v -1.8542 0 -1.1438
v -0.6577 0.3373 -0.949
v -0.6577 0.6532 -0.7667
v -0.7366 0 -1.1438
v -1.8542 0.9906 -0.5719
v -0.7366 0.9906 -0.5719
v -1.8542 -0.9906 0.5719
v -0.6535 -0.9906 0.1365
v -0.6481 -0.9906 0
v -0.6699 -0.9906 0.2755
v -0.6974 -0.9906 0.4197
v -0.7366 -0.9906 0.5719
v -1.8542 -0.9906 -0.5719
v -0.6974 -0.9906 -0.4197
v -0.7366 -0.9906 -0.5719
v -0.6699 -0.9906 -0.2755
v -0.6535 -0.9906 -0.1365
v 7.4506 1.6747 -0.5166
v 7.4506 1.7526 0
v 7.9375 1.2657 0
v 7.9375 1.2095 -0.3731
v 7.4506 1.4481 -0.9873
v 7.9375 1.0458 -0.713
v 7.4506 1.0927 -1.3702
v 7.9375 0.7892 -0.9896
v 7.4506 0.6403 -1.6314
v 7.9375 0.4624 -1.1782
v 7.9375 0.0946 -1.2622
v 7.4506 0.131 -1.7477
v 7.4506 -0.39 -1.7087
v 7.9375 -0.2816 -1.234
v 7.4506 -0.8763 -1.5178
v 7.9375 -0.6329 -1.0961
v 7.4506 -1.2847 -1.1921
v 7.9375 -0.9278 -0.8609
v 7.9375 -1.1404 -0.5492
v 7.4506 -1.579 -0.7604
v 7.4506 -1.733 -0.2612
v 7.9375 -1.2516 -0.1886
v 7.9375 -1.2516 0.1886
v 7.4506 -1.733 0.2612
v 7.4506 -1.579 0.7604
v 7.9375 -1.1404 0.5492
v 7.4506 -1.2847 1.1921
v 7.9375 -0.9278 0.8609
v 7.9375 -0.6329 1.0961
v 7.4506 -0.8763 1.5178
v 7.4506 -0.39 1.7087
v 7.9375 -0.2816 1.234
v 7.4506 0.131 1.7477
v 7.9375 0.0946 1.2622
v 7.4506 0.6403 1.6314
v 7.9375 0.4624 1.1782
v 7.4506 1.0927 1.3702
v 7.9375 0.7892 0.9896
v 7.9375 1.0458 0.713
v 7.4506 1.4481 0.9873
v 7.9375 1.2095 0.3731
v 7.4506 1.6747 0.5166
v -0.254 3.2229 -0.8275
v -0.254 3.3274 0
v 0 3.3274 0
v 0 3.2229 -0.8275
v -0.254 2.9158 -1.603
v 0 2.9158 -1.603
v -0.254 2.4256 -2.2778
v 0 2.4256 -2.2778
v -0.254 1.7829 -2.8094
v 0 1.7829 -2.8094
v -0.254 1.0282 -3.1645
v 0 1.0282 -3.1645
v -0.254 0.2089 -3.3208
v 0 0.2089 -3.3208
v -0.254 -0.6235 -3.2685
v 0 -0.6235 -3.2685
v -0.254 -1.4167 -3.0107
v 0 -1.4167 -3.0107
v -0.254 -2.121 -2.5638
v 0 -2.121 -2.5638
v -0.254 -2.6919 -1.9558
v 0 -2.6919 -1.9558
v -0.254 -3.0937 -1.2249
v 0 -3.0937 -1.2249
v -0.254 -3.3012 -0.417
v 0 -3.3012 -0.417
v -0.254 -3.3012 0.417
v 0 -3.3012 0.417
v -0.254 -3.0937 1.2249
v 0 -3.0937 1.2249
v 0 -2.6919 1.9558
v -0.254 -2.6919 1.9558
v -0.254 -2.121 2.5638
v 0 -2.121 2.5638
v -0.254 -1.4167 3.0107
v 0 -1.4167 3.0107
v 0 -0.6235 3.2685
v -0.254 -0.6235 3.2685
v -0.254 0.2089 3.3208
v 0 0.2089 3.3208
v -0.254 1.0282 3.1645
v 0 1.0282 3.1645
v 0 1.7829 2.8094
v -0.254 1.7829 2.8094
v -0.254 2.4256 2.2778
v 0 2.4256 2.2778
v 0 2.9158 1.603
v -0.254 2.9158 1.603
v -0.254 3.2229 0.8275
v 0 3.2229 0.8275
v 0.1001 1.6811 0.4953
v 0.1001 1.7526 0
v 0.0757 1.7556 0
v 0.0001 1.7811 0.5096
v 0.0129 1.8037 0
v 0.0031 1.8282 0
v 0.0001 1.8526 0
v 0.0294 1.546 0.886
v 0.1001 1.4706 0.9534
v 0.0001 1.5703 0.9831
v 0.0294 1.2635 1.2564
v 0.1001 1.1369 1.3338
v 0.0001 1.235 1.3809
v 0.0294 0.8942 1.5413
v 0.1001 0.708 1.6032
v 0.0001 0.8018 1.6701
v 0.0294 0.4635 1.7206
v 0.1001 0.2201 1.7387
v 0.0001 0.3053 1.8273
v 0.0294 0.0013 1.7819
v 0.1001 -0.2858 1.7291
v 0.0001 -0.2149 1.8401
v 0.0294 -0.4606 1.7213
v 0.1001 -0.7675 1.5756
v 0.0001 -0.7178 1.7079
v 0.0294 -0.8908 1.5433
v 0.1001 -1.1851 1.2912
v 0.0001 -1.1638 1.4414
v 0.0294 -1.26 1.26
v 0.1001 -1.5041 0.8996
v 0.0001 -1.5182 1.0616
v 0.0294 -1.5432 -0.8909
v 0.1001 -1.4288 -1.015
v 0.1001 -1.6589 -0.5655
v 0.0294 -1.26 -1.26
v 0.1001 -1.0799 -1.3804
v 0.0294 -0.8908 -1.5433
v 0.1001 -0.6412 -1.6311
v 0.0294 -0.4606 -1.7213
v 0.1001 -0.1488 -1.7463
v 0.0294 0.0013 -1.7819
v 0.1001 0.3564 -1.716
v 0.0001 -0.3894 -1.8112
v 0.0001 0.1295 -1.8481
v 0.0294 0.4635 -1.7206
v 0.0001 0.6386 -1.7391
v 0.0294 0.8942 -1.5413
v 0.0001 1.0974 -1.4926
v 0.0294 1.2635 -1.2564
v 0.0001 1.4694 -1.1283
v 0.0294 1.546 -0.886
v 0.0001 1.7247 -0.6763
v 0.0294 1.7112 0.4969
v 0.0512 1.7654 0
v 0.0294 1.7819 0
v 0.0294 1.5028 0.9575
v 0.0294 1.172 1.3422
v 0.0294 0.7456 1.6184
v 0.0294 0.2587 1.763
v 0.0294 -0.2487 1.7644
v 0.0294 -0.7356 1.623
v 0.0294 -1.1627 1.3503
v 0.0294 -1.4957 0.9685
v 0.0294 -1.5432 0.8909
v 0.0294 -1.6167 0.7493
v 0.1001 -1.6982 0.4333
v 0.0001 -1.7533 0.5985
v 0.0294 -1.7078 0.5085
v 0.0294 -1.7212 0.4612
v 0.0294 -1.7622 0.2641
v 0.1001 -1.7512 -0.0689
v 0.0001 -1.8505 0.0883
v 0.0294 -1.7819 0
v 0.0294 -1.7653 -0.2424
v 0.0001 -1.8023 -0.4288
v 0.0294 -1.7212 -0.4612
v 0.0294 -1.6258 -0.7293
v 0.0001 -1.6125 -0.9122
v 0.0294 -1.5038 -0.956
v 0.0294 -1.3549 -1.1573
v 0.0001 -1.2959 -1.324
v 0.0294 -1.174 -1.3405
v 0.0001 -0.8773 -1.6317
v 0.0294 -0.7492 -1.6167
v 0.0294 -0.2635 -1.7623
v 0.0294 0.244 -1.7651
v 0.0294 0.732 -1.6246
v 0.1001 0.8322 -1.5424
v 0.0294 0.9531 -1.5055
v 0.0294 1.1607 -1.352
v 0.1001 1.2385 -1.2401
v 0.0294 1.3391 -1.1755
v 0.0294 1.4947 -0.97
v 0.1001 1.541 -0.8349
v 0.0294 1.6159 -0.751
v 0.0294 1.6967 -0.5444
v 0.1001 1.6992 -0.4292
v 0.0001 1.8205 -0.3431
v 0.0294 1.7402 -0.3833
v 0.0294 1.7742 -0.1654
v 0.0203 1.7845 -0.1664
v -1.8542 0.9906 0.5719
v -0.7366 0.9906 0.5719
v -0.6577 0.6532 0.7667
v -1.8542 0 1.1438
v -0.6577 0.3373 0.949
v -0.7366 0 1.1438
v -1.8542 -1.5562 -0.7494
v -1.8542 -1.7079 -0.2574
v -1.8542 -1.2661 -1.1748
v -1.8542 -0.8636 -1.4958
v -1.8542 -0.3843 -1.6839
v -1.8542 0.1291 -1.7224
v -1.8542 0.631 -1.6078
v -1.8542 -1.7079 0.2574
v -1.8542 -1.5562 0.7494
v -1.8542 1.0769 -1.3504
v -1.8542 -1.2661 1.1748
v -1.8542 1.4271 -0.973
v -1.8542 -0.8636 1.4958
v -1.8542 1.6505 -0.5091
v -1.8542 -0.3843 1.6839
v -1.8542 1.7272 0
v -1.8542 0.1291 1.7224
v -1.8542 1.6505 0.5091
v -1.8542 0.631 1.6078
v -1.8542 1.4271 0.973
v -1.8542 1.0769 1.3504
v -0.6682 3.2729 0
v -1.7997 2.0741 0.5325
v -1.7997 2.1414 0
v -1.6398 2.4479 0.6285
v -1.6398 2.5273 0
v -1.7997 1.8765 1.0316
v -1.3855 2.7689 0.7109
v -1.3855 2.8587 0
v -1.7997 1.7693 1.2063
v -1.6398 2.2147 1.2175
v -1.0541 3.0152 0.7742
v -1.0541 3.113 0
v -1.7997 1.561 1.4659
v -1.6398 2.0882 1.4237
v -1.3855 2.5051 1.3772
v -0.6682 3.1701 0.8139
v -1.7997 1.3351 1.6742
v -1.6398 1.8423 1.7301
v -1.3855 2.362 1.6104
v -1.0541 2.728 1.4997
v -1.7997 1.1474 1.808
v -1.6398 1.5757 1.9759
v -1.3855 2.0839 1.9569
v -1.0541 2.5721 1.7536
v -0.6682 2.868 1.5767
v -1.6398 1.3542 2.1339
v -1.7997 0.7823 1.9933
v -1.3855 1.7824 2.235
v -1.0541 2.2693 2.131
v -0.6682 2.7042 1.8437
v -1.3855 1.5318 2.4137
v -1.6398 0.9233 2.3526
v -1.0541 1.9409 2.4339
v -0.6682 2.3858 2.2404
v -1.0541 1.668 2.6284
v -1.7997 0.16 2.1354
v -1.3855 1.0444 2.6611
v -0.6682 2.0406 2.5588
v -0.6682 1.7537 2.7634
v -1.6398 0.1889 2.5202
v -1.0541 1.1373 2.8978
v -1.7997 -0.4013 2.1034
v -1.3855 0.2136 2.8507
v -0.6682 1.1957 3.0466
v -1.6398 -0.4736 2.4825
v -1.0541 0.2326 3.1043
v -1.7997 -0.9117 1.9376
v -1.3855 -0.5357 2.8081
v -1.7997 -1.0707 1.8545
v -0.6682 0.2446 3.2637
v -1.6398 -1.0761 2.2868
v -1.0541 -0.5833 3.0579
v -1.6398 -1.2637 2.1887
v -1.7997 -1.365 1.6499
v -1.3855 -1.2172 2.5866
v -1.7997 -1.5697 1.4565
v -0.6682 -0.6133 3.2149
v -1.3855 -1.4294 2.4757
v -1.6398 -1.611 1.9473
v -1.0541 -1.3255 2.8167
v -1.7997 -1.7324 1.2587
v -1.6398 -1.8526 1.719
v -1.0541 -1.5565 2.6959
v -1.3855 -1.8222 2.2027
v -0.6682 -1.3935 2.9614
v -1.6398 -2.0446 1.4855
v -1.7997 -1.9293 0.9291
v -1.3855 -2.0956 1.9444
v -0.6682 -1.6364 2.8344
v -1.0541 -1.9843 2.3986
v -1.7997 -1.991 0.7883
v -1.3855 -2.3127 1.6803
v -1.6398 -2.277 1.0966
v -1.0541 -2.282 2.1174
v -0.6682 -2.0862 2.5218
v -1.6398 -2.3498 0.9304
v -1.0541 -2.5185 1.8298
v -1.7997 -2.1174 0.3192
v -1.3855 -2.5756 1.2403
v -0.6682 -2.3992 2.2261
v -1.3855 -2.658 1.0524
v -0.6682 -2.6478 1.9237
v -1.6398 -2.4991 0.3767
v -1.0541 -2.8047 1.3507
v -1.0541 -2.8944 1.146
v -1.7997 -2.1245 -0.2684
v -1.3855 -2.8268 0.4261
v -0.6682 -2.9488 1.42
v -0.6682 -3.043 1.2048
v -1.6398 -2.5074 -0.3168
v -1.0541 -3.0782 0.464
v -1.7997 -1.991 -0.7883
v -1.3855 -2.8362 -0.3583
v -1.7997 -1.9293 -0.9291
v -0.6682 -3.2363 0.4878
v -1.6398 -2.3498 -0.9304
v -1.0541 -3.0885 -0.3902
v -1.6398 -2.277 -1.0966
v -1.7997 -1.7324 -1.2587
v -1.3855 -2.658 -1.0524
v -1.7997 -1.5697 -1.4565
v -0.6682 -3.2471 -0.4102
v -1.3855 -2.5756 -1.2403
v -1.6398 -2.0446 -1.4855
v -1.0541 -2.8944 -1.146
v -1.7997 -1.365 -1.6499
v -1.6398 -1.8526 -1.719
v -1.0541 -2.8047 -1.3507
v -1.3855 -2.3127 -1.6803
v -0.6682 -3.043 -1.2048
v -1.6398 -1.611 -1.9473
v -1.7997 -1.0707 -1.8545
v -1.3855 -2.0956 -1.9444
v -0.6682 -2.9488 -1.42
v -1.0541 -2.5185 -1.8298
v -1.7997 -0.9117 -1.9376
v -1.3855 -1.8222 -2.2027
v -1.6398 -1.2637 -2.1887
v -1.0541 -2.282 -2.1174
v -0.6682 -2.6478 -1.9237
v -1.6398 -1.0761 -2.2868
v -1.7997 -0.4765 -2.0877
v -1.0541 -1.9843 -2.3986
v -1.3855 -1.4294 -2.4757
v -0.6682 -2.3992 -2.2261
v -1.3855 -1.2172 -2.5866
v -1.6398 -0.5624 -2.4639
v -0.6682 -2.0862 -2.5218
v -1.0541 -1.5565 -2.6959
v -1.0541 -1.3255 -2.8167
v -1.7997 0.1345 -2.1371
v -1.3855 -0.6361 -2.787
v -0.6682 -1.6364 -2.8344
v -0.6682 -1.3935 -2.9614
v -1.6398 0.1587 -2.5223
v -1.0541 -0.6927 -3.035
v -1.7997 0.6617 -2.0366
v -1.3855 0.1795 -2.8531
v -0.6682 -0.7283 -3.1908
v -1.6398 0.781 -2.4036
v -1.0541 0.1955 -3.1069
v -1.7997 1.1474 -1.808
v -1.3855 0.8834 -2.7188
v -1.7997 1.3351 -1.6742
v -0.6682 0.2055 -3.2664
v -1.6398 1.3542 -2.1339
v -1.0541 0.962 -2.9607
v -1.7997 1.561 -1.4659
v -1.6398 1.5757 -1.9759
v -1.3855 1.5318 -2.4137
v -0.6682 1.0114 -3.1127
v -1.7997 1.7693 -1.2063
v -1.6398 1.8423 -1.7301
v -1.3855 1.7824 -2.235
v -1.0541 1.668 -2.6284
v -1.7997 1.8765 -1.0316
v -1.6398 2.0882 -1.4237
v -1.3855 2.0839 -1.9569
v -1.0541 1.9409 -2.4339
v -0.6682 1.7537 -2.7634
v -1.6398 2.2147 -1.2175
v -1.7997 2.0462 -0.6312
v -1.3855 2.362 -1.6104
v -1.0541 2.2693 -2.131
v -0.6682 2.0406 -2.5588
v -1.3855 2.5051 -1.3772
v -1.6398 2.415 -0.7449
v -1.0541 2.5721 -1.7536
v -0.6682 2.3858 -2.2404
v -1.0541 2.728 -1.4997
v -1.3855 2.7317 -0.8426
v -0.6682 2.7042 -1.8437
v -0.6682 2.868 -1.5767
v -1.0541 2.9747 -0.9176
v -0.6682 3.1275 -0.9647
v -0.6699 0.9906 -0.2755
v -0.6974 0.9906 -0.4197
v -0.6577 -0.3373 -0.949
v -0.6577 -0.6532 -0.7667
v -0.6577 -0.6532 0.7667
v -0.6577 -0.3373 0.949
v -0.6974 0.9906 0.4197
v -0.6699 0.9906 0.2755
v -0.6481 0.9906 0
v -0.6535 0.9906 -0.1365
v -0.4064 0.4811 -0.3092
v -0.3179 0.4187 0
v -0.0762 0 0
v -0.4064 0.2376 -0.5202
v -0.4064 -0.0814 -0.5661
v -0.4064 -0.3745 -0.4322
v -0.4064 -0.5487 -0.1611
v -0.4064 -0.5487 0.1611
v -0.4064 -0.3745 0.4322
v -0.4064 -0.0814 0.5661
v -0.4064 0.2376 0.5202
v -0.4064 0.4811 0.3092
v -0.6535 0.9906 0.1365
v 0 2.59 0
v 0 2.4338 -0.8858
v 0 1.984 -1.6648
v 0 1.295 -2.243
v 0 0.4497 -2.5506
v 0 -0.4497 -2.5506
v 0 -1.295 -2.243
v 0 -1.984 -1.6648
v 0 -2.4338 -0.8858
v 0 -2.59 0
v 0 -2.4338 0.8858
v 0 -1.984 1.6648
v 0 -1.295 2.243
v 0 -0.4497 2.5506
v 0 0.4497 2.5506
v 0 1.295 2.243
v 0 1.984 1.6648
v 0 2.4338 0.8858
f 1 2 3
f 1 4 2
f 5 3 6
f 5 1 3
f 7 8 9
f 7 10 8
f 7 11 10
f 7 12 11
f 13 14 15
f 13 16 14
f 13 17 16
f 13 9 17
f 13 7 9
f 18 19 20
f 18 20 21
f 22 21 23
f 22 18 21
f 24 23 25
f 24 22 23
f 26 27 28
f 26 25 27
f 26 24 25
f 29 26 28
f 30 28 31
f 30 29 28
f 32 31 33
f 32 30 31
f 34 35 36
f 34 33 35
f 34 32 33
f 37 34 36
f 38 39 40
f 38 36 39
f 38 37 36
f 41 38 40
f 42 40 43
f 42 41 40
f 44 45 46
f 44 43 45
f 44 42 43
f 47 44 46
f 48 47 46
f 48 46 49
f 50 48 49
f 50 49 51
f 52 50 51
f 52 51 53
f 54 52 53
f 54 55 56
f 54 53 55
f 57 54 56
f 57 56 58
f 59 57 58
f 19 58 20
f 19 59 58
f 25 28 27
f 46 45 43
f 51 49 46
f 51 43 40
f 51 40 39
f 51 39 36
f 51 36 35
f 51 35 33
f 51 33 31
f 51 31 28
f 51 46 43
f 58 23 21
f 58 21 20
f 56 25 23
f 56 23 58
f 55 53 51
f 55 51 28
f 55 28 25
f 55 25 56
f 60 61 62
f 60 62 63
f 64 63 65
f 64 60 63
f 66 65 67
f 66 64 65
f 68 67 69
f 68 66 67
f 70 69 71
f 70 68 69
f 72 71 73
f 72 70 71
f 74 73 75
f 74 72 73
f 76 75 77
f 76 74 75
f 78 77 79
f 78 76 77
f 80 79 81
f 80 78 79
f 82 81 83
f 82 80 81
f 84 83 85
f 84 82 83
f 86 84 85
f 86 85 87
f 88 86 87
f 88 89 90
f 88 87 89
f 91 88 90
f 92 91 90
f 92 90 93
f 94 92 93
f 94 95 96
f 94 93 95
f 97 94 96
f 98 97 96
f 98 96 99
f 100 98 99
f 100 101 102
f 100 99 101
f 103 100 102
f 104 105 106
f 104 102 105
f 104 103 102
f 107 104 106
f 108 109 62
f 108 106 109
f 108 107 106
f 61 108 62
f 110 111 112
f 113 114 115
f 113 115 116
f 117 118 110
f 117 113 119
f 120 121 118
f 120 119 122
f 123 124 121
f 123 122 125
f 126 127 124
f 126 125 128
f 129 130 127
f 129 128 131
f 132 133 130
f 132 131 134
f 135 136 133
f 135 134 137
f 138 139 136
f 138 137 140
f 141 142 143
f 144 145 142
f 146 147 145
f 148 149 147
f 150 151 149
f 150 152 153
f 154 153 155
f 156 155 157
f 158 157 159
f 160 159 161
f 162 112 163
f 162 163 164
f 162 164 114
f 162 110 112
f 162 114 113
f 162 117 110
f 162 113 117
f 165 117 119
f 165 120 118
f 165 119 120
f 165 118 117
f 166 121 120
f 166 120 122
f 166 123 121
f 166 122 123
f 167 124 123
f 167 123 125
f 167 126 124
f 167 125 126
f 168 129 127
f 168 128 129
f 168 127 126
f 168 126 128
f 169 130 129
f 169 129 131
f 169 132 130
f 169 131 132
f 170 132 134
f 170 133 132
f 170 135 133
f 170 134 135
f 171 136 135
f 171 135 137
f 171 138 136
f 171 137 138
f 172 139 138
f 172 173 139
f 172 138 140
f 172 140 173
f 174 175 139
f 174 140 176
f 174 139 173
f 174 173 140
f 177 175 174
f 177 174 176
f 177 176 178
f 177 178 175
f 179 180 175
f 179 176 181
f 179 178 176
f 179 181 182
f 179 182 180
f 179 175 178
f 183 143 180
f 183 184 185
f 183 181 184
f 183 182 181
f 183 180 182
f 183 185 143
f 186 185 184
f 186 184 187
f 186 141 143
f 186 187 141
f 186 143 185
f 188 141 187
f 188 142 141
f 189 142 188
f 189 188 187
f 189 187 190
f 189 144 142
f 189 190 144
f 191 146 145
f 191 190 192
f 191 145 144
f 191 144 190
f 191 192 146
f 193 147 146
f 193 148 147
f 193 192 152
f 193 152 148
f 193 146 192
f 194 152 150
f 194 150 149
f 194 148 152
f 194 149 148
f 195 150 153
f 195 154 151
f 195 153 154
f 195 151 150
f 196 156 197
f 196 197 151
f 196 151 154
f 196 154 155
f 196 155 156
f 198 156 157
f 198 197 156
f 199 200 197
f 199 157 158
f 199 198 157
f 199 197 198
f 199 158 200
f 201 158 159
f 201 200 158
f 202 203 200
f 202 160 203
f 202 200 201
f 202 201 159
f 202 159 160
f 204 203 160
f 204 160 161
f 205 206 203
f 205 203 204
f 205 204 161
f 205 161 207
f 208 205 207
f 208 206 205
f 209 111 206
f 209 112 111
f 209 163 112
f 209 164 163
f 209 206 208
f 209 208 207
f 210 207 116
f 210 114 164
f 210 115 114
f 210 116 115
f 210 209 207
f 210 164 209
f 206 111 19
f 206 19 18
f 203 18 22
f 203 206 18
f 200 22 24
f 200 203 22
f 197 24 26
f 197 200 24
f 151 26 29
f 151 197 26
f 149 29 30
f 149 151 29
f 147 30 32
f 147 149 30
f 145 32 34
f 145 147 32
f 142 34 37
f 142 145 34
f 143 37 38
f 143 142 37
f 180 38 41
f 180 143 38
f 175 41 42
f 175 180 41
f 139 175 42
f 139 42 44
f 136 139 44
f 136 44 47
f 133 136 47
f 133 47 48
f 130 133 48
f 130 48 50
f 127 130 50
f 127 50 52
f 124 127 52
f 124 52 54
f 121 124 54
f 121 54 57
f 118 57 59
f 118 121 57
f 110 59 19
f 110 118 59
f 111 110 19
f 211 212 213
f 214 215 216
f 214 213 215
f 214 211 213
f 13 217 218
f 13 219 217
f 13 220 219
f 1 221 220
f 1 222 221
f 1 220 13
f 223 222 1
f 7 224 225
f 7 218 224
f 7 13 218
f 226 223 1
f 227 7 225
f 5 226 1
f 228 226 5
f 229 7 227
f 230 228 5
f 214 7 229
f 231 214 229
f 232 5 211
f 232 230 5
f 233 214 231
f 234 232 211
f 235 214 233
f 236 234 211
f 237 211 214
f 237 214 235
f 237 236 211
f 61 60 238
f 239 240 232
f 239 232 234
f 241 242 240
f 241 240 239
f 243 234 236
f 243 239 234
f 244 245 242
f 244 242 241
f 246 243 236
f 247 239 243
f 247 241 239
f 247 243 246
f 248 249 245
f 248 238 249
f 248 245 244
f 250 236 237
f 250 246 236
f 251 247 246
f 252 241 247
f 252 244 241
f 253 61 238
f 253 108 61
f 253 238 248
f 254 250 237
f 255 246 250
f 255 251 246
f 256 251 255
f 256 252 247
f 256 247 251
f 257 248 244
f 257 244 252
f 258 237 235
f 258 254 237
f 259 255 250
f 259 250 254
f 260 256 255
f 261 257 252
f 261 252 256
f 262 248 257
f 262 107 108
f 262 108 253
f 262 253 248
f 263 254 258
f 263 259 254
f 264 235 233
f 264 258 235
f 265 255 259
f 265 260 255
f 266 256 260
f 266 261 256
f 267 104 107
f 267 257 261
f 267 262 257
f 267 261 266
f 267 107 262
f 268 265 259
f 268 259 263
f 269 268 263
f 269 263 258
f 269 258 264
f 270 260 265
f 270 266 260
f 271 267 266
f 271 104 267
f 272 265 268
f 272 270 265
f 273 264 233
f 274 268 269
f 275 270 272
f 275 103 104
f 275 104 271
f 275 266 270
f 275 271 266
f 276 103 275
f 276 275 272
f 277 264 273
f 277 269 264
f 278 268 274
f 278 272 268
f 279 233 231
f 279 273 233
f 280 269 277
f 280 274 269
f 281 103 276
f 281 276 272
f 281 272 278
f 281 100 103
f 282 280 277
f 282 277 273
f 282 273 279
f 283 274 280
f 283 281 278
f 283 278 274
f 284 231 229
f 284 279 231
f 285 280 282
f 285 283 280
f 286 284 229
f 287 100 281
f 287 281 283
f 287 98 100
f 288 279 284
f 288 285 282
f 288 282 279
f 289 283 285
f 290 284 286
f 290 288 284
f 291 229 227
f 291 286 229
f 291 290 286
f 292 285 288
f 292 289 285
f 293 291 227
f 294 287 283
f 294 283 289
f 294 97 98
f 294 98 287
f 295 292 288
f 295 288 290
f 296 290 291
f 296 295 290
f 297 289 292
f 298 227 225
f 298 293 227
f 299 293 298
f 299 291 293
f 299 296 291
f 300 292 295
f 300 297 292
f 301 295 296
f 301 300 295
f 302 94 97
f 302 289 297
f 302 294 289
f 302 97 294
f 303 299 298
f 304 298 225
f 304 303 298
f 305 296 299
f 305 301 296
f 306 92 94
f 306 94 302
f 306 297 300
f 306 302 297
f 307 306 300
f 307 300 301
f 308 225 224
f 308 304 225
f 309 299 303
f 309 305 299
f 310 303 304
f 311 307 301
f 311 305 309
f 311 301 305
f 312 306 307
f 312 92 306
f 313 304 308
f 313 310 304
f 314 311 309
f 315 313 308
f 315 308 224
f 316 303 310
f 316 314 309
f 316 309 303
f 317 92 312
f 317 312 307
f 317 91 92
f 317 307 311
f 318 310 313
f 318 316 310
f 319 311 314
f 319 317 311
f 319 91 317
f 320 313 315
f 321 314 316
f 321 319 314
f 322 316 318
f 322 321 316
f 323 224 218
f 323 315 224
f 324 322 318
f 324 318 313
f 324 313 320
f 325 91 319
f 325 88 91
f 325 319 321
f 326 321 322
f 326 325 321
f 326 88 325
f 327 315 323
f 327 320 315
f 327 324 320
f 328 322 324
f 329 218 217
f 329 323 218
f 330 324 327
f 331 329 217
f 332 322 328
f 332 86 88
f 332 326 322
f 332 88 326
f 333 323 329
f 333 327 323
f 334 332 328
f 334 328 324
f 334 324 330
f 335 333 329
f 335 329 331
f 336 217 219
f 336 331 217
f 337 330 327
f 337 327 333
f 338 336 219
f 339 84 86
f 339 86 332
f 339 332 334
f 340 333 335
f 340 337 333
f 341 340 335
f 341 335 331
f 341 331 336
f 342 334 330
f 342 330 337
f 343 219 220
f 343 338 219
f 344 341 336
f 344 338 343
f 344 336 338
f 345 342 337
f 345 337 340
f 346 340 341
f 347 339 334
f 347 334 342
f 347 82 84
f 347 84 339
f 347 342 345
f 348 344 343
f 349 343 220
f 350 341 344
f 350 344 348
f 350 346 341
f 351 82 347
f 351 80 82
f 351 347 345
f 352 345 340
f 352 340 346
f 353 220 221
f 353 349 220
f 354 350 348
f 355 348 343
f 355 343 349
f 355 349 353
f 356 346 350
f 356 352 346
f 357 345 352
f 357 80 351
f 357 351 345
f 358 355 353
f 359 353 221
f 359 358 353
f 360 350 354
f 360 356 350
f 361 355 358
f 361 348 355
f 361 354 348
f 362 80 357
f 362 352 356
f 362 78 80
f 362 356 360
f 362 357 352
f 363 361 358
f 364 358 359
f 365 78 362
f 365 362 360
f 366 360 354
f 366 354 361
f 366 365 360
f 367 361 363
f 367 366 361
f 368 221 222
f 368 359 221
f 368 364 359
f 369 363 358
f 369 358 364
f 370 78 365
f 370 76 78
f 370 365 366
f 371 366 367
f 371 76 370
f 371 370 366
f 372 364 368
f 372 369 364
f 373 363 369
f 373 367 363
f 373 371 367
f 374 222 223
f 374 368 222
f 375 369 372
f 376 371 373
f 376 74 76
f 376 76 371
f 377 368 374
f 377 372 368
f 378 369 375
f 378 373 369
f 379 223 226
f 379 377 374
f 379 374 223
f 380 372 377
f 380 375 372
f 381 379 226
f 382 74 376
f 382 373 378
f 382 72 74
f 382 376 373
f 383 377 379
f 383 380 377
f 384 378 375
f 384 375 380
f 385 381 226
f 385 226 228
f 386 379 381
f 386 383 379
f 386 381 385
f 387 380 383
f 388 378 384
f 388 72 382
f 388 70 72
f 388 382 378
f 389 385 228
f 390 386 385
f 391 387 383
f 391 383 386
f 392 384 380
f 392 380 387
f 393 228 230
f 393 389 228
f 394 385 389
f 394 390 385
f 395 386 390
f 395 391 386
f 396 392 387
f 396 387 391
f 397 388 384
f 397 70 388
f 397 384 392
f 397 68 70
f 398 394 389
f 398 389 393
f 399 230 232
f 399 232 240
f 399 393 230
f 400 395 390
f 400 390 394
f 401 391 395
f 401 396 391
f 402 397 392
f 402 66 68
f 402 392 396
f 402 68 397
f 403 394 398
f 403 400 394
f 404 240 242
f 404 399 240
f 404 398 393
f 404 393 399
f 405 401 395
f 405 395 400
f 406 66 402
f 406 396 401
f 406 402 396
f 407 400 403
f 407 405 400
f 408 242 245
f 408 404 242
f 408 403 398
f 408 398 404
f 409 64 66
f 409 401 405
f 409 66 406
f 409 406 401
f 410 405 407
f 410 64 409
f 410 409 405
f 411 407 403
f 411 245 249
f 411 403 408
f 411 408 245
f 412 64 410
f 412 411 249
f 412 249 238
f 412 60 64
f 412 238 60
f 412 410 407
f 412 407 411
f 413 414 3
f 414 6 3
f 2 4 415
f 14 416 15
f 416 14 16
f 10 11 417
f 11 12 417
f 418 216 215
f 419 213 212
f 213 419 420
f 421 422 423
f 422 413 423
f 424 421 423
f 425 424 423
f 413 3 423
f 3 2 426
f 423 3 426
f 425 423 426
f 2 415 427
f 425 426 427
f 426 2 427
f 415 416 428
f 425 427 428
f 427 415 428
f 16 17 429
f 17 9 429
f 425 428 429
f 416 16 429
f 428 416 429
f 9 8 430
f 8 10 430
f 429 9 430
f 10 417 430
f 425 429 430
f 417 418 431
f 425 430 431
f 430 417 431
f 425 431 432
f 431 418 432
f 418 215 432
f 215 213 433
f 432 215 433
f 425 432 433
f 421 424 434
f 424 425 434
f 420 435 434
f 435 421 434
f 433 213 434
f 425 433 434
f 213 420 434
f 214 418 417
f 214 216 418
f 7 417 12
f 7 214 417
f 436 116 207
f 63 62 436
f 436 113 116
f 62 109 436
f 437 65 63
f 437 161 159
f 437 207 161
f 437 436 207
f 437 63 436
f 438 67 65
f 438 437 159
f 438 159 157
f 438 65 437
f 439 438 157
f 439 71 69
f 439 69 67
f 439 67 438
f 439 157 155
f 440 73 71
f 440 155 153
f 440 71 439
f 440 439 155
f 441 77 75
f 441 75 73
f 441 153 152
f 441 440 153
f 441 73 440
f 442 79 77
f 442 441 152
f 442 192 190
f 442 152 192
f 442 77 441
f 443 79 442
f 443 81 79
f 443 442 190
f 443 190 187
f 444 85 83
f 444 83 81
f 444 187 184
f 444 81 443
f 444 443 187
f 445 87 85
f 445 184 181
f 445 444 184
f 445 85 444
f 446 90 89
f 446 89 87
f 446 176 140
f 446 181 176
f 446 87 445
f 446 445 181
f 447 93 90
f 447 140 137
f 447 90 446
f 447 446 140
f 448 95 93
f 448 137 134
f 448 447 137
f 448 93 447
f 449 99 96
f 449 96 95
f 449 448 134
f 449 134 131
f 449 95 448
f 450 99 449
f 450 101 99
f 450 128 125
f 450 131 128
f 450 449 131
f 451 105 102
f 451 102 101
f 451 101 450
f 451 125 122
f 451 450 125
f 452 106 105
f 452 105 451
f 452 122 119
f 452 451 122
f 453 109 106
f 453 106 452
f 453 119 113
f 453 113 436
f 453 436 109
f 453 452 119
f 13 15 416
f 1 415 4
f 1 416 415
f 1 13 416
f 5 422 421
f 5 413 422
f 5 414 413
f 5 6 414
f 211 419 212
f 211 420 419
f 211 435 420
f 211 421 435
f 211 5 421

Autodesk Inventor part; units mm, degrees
ref_plane "YZ Plane" through (0, 0, 0) normal (1, 0, 0) x (0, 1, 0)
ref_plane "XZ Plane" through (0, 0, 0) normal (0, 1, 0) x (-1, 0, 0)
sketch "Sketch1" plane through (0, 0, 0) normal (0, 0, 1) x (1, 0, 0)
  line L0 (-0.0762, 0) -> (7.9375, 0)
  line L1 (7.9375, 0) -> (7.9375, 1.7526)
  line L2 (7.9375, 1.7526) -> (1.5902, 1.7526)
  line L3 (1.5902, 1.7526) -> (0.0001, 1.7526)
  line L4 (0.0001, 1.7526) -> (0, 1.7526)
  line L5 (0, 1.7526) -> (0, 3.3274)
  line L6 (0, 3.3274) -> (-1.8542, 3.3274)
  line L7 (-1.8542, 3.3274) -> (-1.8542, 1.1438)
  line L8 (-1.8542, 1.1438) -> (-0.7366, 1.1438)
  line L9 (-0.7366, 1.1438) -> (-0.0762, 0)
  line L10 (-3.8125, 0) -> (9.8958, 0) projected
  line L11 (0, -0.6655) -> (0, 3.9929) projected
  line L12 (1.5902, 1.7526) -> (0, 1.7526) construction
  dimension "d1" = 6.3473
  dimension "d2" = 1.5901
  dimension "d3" = 1.8542
  dimension "d4" = 1.1176
  dimension "d5" = 60
  dimension "d6" = 3.5052
  dimension "d7" = 3.5052
  dimension "d8" = 2.2877
  dimension "d9" = 6.6548
  dimension "d26" = 7.9375
revolve "Body" add sketch "Sketch1" angle 360 about axis through (-0.0762, 0, 0) along (1, 0, 0)
sketch "Sketch2" plane through (-1.8542, 0, 0) normal (-1, 0, 0) x (0, 0, 1)
  circle A0 centre (0, 0) radius 1.1438 projected
  line L0 (0, -4.6584) -> (0, 4.6584) projected
  line L1 (-4.6584, 0) -> (4.6584, 0) projected
  line L2 (1.1438, 0) -> (0.5719, -0.9906)
  line L3 (0.5719, -0.9906) -> (-0.5719, -0.9906)
  line L4 (-0.5719, -0.9906) -> (-1.1438, 0)
  line L5 (-1.1438, 0) -> (-0.5719, 0.9906)
  line L6 (-0.5719, 0.9906) -> (0.5719, 0.9906)
  line L7 (0.5719, 0.9906) -> (1.1438, 0)
  point P0 (0, 0)
extrude "Slot" add sketch "Sketch2" against normal up to next contours L7 A0 | A0 L2 | L6 L0 A0 | A0 L0 L3 | L0 L6 A0 | A0 L3 L0 | L4 A0 | A0 L5
fillet "Fillet1" radius 1.6002 1 edges at (-1.8542, -3.3274, 0)
thread "Thread" size "6-32 UNC" class "2A" standard "ANSI Unified Screw Threads" length 6.3473
chamfer "Chamfer1" distance 0.4869 distance2 0.4869 1 edges at (7.9375, -1.7526, 0) measured on face at (7.9375, -0.5672, -0.1398)
ref_plane "Work Plane1" through (29, 0, 0) normal (0, -1, 0) x (1, 0, 0)
fillet "Fillet2" radius 0.1 1 edges at (0.0001, -1.7526, 0)
equation "\"d1\" = GEL"
equation "\"d3\" = KOH"
equation "\"d4\" = INTI"
equation "\"d6\" = GD"
equation "\"d7\" = BDM"
equation "\"d8\" = 1.1547 * SW"
equation "\"d9\" = KOD"
equation "\"d26\" = NLG"
equation "\"d30\" = R"
equation "\"d17\" = RR"
equation "\"d13\" = GEL"
equation "\"d15\" = -0.5 * SPD + 0.5 * GD"
equation "\"d16\" = GUL"
equation "\"GD\" = NND"
equation "\"NLG\" = 7.9375"
equation "\"GEL\" = 6.34726"
equation "\"KOD\" = 6.6548"
equation "\"KOH\" = 1.8542"
equation "\"INTI\" = 1.1176"
equation "\"GAL\" = 1.59004"
equation "\"GUL\" = 0.48692"
equation "\"BDM\" = NND"
equation "\"SW\" = 1.9812"
equation "\"RR\" = 1.6002"
equation "\"SPD\" = 2.53136"
equation "\"R\" = 0.1"
equation "\"TOA\" = 30deg"
equation "\"GD1\" = SPD"
equation "\"THREADDIA\" = 3.5052"
equation "\"KOH1\" = 0.381"
equation "\"NND\" = 3.5052"
equation "\"E0\" = 2.28829"
properties part number "ANSI B18.3 - 6 - 32 x 5/16" material "Steel, Mild"
